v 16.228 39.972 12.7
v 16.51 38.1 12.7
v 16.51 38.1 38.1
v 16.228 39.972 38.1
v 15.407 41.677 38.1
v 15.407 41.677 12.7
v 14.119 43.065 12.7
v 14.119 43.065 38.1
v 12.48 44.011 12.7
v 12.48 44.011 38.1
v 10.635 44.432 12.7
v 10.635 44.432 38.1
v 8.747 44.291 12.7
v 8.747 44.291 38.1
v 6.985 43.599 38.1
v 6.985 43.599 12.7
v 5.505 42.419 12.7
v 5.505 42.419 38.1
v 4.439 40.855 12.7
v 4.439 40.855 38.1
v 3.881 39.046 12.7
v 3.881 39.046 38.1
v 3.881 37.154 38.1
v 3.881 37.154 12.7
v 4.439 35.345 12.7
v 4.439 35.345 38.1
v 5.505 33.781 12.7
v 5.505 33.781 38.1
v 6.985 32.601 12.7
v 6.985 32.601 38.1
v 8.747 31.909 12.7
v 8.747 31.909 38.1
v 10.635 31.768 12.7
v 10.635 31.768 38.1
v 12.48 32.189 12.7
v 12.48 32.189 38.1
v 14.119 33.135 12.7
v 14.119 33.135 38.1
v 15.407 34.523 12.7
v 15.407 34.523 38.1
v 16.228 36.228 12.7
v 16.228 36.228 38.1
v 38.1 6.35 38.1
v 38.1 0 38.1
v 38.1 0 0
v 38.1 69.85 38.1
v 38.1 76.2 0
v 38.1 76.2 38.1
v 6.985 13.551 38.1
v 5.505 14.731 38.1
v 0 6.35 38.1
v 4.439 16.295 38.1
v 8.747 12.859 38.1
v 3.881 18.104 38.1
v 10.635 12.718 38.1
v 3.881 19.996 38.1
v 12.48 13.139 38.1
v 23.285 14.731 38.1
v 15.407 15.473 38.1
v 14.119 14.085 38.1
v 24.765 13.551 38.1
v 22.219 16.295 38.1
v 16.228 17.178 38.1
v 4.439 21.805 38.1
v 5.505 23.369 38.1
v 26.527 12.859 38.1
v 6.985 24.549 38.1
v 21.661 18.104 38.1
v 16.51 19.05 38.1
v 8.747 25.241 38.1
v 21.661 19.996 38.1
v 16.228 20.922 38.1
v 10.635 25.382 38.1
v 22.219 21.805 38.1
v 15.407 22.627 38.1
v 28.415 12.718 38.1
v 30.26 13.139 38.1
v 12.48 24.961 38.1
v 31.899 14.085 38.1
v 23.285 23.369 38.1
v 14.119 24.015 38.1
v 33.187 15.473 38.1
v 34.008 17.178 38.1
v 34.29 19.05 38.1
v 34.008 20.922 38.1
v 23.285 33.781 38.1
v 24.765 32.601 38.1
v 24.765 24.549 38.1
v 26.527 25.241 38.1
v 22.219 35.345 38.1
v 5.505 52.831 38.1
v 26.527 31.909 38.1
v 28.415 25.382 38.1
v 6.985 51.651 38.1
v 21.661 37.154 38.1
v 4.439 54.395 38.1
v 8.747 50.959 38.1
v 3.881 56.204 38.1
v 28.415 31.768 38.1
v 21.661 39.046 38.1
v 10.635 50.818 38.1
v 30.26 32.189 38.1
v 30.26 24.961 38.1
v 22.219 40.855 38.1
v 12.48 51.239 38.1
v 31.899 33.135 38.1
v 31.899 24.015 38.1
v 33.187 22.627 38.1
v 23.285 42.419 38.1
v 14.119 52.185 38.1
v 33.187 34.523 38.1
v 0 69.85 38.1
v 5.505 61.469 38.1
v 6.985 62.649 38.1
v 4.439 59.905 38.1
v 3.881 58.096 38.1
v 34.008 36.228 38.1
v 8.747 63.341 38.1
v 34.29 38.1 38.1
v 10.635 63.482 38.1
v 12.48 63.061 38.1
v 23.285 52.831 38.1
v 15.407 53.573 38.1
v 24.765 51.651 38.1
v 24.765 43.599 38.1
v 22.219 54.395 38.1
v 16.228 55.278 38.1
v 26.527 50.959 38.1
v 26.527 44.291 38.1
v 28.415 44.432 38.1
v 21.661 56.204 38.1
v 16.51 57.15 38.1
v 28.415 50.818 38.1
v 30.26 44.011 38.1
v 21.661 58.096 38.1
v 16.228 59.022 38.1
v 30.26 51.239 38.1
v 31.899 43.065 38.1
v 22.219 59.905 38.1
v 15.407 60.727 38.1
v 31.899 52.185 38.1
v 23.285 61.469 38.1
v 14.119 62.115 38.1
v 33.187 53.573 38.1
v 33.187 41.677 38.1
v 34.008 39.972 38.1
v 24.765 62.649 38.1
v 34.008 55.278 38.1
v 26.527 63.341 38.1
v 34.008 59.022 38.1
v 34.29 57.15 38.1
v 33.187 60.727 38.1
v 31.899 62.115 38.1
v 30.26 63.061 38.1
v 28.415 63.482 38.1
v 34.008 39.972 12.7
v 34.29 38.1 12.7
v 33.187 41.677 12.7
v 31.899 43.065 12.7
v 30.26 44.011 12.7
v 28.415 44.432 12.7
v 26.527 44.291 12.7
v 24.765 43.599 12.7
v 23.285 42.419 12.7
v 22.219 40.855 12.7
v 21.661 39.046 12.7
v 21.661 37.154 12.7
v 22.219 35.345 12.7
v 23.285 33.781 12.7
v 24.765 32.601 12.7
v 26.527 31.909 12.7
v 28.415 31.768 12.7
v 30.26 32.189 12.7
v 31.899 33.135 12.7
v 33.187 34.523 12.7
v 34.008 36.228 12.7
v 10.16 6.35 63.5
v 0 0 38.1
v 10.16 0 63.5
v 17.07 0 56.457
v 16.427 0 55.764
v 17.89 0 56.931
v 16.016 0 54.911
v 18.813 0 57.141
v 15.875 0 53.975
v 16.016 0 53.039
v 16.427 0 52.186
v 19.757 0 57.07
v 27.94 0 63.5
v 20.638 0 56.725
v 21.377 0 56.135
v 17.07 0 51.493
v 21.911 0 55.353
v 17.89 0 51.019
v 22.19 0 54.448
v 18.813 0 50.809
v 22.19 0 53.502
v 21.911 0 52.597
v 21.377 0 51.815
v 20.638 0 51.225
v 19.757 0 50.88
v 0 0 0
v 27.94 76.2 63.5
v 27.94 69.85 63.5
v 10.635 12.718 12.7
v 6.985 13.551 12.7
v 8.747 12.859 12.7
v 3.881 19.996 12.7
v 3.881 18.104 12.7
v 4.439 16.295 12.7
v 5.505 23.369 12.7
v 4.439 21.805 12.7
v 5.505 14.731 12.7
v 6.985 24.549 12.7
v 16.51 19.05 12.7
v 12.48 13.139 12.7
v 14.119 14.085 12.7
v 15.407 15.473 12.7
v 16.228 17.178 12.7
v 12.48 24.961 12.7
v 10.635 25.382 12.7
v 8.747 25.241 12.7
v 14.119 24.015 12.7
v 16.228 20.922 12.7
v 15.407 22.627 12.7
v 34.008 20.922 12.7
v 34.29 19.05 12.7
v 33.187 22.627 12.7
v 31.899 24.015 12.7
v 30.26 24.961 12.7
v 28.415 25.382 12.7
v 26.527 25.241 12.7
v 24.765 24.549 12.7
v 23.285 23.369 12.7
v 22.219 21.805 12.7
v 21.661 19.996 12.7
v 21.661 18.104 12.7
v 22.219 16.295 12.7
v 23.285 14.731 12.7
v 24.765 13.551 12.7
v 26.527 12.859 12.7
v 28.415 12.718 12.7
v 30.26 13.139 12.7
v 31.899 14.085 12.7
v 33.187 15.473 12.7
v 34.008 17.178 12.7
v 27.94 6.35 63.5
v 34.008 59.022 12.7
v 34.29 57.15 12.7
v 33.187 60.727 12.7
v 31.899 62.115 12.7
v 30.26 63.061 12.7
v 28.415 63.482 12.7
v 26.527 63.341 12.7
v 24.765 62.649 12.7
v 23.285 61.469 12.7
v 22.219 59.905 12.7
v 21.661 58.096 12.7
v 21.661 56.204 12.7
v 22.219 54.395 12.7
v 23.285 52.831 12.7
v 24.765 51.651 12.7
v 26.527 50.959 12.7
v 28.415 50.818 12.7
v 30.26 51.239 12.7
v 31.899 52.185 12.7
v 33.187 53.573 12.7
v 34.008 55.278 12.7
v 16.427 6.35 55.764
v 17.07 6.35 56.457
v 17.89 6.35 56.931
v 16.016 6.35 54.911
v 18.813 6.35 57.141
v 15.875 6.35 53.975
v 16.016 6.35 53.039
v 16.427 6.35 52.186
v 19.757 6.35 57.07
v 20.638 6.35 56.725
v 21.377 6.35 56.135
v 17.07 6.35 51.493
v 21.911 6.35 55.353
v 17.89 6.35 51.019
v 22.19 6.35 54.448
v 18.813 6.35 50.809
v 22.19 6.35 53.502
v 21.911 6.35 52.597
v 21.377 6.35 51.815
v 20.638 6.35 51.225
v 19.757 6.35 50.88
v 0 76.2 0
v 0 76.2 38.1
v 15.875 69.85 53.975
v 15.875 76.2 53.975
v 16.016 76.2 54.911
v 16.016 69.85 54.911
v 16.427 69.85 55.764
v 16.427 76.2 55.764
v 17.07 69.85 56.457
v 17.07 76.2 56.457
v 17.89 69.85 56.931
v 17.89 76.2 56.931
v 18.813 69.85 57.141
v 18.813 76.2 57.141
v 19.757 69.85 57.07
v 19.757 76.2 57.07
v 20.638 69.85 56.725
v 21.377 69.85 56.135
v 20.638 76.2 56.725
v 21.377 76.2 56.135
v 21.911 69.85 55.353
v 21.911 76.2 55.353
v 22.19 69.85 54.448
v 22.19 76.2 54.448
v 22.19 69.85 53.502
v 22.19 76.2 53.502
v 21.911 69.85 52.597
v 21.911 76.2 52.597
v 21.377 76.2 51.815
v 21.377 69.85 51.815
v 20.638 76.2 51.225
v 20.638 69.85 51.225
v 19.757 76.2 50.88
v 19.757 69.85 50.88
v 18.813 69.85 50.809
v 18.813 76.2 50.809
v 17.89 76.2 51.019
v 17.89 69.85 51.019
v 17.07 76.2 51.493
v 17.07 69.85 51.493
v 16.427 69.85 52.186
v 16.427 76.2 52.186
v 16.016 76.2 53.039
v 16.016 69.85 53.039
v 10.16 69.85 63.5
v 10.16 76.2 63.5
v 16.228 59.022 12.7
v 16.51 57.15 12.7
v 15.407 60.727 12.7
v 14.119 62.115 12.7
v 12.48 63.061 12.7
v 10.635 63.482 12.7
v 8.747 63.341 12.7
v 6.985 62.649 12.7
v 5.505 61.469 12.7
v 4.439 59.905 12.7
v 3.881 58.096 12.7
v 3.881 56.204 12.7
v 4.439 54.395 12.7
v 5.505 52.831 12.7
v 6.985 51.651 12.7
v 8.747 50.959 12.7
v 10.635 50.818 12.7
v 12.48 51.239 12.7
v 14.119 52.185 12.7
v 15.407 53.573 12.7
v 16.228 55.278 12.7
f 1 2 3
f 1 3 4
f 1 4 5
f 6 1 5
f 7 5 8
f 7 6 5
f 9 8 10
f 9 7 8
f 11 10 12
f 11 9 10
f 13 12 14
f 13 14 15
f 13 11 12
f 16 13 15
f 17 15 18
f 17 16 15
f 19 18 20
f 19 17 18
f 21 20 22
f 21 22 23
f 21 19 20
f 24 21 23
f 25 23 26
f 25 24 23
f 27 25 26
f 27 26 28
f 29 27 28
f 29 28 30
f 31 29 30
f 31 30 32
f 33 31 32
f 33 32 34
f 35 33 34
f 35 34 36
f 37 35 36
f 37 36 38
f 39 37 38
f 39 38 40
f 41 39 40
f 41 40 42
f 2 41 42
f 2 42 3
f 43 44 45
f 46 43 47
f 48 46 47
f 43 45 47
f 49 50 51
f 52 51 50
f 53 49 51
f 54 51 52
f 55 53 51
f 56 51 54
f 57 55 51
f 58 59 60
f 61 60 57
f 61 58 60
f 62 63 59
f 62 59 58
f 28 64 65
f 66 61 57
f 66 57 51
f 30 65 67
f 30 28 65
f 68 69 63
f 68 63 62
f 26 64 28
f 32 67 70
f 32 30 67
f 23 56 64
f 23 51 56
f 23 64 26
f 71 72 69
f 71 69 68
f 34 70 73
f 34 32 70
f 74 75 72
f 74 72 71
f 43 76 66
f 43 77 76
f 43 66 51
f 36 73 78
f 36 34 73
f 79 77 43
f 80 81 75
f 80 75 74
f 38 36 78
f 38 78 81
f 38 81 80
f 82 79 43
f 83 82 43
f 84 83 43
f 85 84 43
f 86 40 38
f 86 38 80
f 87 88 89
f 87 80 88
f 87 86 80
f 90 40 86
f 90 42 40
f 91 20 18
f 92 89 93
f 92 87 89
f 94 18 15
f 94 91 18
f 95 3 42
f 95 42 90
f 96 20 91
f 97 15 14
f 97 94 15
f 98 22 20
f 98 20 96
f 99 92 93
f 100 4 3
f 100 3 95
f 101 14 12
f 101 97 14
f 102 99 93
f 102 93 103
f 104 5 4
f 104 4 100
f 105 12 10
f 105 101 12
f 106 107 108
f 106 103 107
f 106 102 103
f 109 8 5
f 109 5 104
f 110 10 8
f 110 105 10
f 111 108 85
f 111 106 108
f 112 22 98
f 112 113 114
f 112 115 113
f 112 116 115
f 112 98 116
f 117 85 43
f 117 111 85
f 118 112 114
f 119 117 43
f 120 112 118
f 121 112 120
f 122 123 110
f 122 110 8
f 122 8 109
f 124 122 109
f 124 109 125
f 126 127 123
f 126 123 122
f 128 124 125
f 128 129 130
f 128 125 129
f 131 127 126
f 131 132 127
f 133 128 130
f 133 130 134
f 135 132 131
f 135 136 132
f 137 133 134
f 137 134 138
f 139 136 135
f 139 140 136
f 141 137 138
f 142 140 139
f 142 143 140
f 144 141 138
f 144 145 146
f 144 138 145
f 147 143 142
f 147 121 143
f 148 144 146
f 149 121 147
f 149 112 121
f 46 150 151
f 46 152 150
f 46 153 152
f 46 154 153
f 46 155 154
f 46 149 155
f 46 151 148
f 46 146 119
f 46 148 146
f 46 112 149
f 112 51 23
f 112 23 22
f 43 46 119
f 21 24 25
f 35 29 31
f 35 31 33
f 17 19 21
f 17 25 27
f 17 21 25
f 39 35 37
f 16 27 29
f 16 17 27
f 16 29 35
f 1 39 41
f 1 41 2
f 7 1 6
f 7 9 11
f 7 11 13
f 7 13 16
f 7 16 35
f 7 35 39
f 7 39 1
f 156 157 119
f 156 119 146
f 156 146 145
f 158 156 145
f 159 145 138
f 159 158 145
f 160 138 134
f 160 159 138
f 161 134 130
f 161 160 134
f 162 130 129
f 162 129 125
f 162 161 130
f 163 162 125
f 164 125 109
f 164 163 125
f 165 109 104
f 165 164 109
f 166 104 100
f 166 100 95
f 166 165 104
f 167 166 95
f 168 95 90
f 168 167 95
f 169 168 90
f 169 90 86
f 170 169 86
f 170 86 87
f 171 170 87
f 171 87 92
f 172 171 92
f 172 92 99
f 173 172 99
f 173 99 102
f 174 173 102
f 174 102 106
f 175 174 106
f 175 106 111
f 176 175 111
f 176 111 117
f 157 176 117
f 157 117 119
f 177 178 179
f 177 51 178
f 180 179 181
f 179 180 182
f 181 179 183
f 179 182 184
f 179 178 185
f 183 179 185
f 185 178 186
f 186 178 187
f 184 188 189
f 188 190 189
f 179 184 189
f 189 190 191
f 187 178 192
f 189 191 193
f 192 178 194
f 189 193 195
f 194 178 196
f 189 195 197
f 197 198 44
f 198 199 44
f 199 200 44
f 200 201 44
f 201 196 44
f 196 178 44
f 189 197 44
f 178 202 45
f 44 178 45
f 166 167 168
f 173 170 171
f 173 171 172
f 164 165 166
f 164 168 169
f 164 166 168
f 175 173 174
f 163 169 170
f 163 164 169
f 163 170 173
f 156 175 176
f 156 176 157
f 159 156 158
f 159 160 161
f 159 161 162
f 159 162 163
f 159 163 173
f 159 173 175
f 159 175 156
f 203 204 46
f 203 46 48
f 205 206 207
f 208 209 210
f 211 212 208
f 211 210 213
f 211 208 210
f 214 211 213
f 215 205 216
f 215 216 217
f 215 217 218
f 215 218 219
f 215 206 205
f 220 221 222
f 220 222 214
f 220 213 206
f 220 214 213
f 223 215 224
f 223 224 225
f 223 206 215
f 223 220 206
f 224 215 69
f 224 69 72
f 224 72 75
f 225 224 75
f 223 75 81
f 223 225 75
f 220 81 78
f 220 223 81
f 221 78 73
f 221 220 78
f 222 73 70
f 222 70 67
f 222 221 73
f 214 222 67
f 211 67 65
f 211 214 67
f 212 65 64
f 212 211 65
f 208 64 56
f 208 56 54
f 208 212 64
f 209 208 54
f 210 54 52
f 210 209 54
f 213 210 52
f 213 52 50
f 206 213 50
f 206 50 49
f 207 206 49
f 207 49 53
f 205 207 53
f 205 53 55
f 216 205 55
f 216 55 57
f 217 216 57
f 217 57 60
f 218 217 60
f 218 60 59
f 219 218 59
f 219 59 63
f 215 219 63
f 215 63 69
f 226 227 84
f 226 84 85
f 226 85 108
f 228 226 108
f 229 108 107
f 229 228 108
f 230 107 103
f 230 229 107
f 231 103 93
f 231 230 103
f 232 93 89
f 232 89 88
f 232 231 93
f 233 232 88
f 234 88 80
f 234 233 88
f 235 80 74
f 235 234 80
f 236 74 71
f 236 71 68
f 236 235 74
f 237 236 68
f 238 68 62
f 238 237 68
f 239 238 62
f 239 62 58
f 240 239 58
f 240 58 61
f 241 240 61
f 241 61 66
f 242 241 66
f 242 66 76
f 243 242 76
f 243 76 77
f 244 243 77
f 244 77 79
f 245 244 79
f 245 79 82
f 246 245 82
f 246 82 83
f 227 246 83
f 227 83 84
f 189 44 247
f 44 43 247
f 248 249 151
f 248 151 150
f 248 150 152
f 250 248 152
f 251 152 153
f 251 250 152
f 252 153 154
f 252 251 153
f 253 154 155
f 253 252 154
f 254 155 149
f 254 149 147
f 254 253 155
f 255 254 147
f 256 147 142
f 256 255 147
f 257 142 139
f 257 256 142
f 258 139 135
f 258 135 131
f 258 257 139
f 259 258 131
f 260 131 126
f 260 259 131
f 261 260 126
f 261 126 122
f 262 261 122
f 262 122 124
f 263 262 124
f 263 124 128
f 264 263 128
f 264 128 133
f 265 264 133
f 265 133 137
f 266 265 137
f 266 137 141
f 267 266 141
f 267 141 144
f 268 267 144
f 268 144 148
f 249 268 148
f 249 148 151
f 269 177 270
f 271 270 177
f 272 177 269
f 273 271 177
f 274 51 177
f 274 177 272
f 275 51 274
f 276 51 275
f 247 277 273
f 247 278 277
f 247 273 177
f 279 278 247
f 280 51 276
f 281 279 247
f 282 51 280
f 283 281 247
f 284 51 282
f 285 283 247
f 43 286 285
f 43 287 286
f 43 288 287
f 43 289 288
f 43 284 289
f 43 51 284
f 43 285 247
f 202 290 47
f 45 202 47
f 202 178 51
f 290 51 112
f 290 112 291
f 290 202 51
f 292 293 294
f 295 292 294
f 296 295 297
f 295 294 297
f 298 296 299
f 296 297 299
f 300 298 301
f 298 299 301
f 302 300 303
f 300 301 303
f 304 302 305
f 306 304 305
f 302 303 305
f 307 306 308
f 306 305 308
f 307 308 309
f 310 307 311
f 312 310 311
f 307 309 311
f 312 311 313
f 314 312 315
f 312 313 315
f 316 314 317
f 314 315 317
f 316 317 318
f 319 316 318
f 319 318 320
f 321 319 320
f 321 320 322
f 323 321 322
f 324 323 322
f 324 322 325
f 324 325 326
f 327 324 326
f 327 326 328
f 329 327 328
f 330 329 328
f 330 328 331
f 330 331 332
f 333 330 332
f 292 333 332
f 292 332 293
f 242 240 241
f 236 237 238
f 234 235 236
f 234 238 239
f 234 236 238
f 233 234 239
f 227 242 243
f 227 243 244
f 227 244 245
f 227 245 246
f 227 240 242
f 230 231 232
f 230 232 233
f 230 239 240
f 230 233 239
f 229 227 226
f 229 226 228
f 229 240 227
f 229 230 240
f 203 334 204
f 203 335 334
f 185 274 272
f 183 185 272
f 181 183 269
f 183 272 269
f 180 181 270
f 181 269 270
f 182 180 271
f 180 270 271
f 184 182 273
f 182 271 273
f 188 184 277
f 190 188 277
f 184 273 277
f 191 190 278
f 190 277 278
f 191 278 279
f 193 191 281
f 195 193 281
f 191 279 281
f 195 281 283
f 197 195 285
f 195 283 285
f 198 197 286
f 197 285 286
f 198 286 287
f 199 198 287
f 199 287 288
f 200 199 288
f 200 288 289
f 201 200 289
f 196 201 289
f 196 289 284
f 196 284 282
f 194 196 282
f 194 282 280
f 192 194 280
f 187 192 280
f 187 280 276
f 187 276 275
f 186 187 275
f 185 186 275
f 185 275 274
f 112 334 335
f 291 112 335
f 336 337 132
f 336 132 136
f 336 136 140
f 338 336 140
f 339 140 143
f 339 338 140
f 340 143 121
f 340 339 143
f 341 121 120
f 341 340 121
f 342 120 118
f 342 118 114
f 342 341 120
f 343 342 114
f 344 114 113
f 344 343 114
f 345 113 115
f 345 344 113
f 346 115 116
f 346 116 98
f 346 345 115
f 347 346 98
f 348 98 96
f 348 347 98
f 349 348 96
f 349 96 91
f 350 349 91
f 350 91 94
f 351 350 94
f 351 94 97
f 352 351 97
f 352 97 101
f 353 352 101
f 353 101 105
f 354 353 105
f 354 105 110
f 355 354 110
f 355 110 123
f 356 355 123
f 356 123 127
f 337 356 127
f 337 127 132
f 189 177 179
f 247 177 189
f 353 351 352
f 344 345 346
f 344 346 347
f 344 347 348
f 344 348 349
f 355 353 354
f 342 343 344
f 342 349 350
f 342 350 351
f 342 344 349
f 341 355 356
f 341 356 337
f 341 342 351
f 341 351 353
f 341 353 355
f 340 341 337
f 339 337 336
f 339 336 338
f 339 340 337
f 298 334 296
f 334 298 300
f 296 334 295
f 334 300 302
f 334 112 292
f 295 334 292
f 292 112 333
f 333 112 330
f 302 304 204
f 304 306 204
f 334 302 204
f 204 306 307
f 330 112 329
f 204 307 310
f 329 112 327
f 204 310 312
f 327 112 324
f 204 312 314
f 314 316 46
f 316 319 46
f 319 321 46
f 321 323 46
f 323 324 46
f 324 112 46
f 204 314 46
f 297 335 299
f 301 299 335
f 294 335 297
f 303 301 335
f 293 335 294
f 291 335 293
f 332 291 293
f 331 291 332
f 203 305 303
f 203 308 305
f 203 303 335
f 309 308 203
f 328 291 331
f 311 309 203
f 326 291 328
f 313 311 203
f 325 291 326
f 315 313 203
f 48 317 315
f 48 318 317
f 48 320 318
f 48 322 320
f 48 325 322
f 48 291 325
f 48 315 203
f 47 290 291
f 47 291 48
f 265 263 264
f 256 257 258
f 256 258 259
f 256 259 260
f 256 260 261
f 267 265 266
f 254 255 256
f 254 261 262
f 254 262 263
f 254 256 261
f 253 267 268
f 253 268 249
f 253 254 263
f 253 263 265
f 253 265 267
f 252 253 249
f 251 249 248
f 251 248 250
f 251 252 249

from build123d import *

# Parameters (mm, degrees)
F0_W       = 38.1
F0_H       = 76.2
F0_R       = 6.35
F1_DEPTH   = 38.1
F2_DEPTH   = 12.7
F3_W       = 38.1
F3_H       = 6.35
F4_DEPTH   = 25.4
F5_SIZE2   = 10.16
F5_SIZE    = 25.4
F6_SIZE2   = 10.16
F6_SIZE    = 25.4
F6_2_SIZE2 = 10.16
F6_2_SIZE  = 25.4
F7_R       = 3.175
F8_DEPTH   = 105.84064


with BuildPart() as f1:
    # F0 (on Top) → F1 (new body)
    with BuildSketch(Plane.XY):
        with Locations((19.05, 38.1)):
            Rectangle(F0_W, F0_H)
        with Locations((10.16, 19.05)):
            Circle(F0_R, mode=Mode.SUBTRACT)
        with Locations((27.94, 19.05)):
            Circle(F0_R, mode=Mode.SUBTRACT)
        with Locations((10.16, 38.1)):
            Circle(F0_R, mode=Mode.SUBTRACT)
        with Locations((10.16, 57.15)):
            Circle(F0_R, mode=Mode.SUBTRACT)
        with Locations((27.94, 38.1)):
            Circle(F0_R, mode=Mode.SUBTRACT)
        with Locations((27.94, 57.15)):
            Circle(F0_R, mode=Mode.SUBTRACT)
    extrude(amount=F1_DEPTH)

    # F0 (on Top) → F2 (join)
    with BuildSketch(Plane.XY):
        with Locations((10.16, 57.15)):
            Circle(F0_R)
        with Locations((27.94, 57.15)):
            Circle(F0_R)
        with Locations((27.94, 38.1)):
            Circle(F0_R)
        with Locations((10.16, 19.05)):
            Circle(F0_R)
        with Locations((27.94, 19.05)):
            Circle(F0_R)
        with Locations((10.16, 38.1)):
            Circle(F0_R)
    extrude(amount=F2_DEPTH)

    # F3 (on face) → F4 (join)
    with BuildSketch(Plane.XY.offset(38.1)):
        with Locations((19.05, 73.025)):
            Rectangle(F3_W, F3_H)
        with Locations((19.05, 3.175)):
            Rectangle(F3_W, F3_H)
    extrude(amount=F4_DEPTH)

    # F5
    f5_edges = [f1.edges().sort_by_distance(p)[0] for p in [
        (38.1, 73.025, 63.5),
        (0, 73.025, 63.5),
    ]]
    chamfer(f5_edges, length=F5_SIZE, length2=F5_SIZE2)

    # F6
    f6_edges = [f1.edges().sort_by_distance(p)[0] for p in [
        (38.1, 3.175, 63.5),
    ]]
    f6_side = f1.faces().sort_by_distance((38.1, 36.261842, 20.721053))[0]
    chamfer(f6_edges, length=F6_SIZE, length2=F6_SIZE2, reference=f6_side)

    # F6#2
    f6_2_edges = [f1.edges().sort_by_distance(p)[0] for p in [
        (0, 3.175, 63.5),
    ]]
    f6_2_side = f1.faces().sort_by_distance((0, 36.261842, 20.721053))[0]
    chamfer(f6_2_edges, length=F6_2_SIZE, length2=F6_2_SIZE2, reference=f6_2_side)

    # F7 (on face) → F8 (cut)
    with BuildSketch(Plane(origin=(0, 76.2, 0), x_dir=(-1, 0, 0), z_dir=(0, 1, 0))):
        with Locations((-19.05, 53.975)):
            Circle(F7_R)
    extrude(amount=-F8_DEPTH, mode=Mode.SUBTRACT)


solid = f1.part
